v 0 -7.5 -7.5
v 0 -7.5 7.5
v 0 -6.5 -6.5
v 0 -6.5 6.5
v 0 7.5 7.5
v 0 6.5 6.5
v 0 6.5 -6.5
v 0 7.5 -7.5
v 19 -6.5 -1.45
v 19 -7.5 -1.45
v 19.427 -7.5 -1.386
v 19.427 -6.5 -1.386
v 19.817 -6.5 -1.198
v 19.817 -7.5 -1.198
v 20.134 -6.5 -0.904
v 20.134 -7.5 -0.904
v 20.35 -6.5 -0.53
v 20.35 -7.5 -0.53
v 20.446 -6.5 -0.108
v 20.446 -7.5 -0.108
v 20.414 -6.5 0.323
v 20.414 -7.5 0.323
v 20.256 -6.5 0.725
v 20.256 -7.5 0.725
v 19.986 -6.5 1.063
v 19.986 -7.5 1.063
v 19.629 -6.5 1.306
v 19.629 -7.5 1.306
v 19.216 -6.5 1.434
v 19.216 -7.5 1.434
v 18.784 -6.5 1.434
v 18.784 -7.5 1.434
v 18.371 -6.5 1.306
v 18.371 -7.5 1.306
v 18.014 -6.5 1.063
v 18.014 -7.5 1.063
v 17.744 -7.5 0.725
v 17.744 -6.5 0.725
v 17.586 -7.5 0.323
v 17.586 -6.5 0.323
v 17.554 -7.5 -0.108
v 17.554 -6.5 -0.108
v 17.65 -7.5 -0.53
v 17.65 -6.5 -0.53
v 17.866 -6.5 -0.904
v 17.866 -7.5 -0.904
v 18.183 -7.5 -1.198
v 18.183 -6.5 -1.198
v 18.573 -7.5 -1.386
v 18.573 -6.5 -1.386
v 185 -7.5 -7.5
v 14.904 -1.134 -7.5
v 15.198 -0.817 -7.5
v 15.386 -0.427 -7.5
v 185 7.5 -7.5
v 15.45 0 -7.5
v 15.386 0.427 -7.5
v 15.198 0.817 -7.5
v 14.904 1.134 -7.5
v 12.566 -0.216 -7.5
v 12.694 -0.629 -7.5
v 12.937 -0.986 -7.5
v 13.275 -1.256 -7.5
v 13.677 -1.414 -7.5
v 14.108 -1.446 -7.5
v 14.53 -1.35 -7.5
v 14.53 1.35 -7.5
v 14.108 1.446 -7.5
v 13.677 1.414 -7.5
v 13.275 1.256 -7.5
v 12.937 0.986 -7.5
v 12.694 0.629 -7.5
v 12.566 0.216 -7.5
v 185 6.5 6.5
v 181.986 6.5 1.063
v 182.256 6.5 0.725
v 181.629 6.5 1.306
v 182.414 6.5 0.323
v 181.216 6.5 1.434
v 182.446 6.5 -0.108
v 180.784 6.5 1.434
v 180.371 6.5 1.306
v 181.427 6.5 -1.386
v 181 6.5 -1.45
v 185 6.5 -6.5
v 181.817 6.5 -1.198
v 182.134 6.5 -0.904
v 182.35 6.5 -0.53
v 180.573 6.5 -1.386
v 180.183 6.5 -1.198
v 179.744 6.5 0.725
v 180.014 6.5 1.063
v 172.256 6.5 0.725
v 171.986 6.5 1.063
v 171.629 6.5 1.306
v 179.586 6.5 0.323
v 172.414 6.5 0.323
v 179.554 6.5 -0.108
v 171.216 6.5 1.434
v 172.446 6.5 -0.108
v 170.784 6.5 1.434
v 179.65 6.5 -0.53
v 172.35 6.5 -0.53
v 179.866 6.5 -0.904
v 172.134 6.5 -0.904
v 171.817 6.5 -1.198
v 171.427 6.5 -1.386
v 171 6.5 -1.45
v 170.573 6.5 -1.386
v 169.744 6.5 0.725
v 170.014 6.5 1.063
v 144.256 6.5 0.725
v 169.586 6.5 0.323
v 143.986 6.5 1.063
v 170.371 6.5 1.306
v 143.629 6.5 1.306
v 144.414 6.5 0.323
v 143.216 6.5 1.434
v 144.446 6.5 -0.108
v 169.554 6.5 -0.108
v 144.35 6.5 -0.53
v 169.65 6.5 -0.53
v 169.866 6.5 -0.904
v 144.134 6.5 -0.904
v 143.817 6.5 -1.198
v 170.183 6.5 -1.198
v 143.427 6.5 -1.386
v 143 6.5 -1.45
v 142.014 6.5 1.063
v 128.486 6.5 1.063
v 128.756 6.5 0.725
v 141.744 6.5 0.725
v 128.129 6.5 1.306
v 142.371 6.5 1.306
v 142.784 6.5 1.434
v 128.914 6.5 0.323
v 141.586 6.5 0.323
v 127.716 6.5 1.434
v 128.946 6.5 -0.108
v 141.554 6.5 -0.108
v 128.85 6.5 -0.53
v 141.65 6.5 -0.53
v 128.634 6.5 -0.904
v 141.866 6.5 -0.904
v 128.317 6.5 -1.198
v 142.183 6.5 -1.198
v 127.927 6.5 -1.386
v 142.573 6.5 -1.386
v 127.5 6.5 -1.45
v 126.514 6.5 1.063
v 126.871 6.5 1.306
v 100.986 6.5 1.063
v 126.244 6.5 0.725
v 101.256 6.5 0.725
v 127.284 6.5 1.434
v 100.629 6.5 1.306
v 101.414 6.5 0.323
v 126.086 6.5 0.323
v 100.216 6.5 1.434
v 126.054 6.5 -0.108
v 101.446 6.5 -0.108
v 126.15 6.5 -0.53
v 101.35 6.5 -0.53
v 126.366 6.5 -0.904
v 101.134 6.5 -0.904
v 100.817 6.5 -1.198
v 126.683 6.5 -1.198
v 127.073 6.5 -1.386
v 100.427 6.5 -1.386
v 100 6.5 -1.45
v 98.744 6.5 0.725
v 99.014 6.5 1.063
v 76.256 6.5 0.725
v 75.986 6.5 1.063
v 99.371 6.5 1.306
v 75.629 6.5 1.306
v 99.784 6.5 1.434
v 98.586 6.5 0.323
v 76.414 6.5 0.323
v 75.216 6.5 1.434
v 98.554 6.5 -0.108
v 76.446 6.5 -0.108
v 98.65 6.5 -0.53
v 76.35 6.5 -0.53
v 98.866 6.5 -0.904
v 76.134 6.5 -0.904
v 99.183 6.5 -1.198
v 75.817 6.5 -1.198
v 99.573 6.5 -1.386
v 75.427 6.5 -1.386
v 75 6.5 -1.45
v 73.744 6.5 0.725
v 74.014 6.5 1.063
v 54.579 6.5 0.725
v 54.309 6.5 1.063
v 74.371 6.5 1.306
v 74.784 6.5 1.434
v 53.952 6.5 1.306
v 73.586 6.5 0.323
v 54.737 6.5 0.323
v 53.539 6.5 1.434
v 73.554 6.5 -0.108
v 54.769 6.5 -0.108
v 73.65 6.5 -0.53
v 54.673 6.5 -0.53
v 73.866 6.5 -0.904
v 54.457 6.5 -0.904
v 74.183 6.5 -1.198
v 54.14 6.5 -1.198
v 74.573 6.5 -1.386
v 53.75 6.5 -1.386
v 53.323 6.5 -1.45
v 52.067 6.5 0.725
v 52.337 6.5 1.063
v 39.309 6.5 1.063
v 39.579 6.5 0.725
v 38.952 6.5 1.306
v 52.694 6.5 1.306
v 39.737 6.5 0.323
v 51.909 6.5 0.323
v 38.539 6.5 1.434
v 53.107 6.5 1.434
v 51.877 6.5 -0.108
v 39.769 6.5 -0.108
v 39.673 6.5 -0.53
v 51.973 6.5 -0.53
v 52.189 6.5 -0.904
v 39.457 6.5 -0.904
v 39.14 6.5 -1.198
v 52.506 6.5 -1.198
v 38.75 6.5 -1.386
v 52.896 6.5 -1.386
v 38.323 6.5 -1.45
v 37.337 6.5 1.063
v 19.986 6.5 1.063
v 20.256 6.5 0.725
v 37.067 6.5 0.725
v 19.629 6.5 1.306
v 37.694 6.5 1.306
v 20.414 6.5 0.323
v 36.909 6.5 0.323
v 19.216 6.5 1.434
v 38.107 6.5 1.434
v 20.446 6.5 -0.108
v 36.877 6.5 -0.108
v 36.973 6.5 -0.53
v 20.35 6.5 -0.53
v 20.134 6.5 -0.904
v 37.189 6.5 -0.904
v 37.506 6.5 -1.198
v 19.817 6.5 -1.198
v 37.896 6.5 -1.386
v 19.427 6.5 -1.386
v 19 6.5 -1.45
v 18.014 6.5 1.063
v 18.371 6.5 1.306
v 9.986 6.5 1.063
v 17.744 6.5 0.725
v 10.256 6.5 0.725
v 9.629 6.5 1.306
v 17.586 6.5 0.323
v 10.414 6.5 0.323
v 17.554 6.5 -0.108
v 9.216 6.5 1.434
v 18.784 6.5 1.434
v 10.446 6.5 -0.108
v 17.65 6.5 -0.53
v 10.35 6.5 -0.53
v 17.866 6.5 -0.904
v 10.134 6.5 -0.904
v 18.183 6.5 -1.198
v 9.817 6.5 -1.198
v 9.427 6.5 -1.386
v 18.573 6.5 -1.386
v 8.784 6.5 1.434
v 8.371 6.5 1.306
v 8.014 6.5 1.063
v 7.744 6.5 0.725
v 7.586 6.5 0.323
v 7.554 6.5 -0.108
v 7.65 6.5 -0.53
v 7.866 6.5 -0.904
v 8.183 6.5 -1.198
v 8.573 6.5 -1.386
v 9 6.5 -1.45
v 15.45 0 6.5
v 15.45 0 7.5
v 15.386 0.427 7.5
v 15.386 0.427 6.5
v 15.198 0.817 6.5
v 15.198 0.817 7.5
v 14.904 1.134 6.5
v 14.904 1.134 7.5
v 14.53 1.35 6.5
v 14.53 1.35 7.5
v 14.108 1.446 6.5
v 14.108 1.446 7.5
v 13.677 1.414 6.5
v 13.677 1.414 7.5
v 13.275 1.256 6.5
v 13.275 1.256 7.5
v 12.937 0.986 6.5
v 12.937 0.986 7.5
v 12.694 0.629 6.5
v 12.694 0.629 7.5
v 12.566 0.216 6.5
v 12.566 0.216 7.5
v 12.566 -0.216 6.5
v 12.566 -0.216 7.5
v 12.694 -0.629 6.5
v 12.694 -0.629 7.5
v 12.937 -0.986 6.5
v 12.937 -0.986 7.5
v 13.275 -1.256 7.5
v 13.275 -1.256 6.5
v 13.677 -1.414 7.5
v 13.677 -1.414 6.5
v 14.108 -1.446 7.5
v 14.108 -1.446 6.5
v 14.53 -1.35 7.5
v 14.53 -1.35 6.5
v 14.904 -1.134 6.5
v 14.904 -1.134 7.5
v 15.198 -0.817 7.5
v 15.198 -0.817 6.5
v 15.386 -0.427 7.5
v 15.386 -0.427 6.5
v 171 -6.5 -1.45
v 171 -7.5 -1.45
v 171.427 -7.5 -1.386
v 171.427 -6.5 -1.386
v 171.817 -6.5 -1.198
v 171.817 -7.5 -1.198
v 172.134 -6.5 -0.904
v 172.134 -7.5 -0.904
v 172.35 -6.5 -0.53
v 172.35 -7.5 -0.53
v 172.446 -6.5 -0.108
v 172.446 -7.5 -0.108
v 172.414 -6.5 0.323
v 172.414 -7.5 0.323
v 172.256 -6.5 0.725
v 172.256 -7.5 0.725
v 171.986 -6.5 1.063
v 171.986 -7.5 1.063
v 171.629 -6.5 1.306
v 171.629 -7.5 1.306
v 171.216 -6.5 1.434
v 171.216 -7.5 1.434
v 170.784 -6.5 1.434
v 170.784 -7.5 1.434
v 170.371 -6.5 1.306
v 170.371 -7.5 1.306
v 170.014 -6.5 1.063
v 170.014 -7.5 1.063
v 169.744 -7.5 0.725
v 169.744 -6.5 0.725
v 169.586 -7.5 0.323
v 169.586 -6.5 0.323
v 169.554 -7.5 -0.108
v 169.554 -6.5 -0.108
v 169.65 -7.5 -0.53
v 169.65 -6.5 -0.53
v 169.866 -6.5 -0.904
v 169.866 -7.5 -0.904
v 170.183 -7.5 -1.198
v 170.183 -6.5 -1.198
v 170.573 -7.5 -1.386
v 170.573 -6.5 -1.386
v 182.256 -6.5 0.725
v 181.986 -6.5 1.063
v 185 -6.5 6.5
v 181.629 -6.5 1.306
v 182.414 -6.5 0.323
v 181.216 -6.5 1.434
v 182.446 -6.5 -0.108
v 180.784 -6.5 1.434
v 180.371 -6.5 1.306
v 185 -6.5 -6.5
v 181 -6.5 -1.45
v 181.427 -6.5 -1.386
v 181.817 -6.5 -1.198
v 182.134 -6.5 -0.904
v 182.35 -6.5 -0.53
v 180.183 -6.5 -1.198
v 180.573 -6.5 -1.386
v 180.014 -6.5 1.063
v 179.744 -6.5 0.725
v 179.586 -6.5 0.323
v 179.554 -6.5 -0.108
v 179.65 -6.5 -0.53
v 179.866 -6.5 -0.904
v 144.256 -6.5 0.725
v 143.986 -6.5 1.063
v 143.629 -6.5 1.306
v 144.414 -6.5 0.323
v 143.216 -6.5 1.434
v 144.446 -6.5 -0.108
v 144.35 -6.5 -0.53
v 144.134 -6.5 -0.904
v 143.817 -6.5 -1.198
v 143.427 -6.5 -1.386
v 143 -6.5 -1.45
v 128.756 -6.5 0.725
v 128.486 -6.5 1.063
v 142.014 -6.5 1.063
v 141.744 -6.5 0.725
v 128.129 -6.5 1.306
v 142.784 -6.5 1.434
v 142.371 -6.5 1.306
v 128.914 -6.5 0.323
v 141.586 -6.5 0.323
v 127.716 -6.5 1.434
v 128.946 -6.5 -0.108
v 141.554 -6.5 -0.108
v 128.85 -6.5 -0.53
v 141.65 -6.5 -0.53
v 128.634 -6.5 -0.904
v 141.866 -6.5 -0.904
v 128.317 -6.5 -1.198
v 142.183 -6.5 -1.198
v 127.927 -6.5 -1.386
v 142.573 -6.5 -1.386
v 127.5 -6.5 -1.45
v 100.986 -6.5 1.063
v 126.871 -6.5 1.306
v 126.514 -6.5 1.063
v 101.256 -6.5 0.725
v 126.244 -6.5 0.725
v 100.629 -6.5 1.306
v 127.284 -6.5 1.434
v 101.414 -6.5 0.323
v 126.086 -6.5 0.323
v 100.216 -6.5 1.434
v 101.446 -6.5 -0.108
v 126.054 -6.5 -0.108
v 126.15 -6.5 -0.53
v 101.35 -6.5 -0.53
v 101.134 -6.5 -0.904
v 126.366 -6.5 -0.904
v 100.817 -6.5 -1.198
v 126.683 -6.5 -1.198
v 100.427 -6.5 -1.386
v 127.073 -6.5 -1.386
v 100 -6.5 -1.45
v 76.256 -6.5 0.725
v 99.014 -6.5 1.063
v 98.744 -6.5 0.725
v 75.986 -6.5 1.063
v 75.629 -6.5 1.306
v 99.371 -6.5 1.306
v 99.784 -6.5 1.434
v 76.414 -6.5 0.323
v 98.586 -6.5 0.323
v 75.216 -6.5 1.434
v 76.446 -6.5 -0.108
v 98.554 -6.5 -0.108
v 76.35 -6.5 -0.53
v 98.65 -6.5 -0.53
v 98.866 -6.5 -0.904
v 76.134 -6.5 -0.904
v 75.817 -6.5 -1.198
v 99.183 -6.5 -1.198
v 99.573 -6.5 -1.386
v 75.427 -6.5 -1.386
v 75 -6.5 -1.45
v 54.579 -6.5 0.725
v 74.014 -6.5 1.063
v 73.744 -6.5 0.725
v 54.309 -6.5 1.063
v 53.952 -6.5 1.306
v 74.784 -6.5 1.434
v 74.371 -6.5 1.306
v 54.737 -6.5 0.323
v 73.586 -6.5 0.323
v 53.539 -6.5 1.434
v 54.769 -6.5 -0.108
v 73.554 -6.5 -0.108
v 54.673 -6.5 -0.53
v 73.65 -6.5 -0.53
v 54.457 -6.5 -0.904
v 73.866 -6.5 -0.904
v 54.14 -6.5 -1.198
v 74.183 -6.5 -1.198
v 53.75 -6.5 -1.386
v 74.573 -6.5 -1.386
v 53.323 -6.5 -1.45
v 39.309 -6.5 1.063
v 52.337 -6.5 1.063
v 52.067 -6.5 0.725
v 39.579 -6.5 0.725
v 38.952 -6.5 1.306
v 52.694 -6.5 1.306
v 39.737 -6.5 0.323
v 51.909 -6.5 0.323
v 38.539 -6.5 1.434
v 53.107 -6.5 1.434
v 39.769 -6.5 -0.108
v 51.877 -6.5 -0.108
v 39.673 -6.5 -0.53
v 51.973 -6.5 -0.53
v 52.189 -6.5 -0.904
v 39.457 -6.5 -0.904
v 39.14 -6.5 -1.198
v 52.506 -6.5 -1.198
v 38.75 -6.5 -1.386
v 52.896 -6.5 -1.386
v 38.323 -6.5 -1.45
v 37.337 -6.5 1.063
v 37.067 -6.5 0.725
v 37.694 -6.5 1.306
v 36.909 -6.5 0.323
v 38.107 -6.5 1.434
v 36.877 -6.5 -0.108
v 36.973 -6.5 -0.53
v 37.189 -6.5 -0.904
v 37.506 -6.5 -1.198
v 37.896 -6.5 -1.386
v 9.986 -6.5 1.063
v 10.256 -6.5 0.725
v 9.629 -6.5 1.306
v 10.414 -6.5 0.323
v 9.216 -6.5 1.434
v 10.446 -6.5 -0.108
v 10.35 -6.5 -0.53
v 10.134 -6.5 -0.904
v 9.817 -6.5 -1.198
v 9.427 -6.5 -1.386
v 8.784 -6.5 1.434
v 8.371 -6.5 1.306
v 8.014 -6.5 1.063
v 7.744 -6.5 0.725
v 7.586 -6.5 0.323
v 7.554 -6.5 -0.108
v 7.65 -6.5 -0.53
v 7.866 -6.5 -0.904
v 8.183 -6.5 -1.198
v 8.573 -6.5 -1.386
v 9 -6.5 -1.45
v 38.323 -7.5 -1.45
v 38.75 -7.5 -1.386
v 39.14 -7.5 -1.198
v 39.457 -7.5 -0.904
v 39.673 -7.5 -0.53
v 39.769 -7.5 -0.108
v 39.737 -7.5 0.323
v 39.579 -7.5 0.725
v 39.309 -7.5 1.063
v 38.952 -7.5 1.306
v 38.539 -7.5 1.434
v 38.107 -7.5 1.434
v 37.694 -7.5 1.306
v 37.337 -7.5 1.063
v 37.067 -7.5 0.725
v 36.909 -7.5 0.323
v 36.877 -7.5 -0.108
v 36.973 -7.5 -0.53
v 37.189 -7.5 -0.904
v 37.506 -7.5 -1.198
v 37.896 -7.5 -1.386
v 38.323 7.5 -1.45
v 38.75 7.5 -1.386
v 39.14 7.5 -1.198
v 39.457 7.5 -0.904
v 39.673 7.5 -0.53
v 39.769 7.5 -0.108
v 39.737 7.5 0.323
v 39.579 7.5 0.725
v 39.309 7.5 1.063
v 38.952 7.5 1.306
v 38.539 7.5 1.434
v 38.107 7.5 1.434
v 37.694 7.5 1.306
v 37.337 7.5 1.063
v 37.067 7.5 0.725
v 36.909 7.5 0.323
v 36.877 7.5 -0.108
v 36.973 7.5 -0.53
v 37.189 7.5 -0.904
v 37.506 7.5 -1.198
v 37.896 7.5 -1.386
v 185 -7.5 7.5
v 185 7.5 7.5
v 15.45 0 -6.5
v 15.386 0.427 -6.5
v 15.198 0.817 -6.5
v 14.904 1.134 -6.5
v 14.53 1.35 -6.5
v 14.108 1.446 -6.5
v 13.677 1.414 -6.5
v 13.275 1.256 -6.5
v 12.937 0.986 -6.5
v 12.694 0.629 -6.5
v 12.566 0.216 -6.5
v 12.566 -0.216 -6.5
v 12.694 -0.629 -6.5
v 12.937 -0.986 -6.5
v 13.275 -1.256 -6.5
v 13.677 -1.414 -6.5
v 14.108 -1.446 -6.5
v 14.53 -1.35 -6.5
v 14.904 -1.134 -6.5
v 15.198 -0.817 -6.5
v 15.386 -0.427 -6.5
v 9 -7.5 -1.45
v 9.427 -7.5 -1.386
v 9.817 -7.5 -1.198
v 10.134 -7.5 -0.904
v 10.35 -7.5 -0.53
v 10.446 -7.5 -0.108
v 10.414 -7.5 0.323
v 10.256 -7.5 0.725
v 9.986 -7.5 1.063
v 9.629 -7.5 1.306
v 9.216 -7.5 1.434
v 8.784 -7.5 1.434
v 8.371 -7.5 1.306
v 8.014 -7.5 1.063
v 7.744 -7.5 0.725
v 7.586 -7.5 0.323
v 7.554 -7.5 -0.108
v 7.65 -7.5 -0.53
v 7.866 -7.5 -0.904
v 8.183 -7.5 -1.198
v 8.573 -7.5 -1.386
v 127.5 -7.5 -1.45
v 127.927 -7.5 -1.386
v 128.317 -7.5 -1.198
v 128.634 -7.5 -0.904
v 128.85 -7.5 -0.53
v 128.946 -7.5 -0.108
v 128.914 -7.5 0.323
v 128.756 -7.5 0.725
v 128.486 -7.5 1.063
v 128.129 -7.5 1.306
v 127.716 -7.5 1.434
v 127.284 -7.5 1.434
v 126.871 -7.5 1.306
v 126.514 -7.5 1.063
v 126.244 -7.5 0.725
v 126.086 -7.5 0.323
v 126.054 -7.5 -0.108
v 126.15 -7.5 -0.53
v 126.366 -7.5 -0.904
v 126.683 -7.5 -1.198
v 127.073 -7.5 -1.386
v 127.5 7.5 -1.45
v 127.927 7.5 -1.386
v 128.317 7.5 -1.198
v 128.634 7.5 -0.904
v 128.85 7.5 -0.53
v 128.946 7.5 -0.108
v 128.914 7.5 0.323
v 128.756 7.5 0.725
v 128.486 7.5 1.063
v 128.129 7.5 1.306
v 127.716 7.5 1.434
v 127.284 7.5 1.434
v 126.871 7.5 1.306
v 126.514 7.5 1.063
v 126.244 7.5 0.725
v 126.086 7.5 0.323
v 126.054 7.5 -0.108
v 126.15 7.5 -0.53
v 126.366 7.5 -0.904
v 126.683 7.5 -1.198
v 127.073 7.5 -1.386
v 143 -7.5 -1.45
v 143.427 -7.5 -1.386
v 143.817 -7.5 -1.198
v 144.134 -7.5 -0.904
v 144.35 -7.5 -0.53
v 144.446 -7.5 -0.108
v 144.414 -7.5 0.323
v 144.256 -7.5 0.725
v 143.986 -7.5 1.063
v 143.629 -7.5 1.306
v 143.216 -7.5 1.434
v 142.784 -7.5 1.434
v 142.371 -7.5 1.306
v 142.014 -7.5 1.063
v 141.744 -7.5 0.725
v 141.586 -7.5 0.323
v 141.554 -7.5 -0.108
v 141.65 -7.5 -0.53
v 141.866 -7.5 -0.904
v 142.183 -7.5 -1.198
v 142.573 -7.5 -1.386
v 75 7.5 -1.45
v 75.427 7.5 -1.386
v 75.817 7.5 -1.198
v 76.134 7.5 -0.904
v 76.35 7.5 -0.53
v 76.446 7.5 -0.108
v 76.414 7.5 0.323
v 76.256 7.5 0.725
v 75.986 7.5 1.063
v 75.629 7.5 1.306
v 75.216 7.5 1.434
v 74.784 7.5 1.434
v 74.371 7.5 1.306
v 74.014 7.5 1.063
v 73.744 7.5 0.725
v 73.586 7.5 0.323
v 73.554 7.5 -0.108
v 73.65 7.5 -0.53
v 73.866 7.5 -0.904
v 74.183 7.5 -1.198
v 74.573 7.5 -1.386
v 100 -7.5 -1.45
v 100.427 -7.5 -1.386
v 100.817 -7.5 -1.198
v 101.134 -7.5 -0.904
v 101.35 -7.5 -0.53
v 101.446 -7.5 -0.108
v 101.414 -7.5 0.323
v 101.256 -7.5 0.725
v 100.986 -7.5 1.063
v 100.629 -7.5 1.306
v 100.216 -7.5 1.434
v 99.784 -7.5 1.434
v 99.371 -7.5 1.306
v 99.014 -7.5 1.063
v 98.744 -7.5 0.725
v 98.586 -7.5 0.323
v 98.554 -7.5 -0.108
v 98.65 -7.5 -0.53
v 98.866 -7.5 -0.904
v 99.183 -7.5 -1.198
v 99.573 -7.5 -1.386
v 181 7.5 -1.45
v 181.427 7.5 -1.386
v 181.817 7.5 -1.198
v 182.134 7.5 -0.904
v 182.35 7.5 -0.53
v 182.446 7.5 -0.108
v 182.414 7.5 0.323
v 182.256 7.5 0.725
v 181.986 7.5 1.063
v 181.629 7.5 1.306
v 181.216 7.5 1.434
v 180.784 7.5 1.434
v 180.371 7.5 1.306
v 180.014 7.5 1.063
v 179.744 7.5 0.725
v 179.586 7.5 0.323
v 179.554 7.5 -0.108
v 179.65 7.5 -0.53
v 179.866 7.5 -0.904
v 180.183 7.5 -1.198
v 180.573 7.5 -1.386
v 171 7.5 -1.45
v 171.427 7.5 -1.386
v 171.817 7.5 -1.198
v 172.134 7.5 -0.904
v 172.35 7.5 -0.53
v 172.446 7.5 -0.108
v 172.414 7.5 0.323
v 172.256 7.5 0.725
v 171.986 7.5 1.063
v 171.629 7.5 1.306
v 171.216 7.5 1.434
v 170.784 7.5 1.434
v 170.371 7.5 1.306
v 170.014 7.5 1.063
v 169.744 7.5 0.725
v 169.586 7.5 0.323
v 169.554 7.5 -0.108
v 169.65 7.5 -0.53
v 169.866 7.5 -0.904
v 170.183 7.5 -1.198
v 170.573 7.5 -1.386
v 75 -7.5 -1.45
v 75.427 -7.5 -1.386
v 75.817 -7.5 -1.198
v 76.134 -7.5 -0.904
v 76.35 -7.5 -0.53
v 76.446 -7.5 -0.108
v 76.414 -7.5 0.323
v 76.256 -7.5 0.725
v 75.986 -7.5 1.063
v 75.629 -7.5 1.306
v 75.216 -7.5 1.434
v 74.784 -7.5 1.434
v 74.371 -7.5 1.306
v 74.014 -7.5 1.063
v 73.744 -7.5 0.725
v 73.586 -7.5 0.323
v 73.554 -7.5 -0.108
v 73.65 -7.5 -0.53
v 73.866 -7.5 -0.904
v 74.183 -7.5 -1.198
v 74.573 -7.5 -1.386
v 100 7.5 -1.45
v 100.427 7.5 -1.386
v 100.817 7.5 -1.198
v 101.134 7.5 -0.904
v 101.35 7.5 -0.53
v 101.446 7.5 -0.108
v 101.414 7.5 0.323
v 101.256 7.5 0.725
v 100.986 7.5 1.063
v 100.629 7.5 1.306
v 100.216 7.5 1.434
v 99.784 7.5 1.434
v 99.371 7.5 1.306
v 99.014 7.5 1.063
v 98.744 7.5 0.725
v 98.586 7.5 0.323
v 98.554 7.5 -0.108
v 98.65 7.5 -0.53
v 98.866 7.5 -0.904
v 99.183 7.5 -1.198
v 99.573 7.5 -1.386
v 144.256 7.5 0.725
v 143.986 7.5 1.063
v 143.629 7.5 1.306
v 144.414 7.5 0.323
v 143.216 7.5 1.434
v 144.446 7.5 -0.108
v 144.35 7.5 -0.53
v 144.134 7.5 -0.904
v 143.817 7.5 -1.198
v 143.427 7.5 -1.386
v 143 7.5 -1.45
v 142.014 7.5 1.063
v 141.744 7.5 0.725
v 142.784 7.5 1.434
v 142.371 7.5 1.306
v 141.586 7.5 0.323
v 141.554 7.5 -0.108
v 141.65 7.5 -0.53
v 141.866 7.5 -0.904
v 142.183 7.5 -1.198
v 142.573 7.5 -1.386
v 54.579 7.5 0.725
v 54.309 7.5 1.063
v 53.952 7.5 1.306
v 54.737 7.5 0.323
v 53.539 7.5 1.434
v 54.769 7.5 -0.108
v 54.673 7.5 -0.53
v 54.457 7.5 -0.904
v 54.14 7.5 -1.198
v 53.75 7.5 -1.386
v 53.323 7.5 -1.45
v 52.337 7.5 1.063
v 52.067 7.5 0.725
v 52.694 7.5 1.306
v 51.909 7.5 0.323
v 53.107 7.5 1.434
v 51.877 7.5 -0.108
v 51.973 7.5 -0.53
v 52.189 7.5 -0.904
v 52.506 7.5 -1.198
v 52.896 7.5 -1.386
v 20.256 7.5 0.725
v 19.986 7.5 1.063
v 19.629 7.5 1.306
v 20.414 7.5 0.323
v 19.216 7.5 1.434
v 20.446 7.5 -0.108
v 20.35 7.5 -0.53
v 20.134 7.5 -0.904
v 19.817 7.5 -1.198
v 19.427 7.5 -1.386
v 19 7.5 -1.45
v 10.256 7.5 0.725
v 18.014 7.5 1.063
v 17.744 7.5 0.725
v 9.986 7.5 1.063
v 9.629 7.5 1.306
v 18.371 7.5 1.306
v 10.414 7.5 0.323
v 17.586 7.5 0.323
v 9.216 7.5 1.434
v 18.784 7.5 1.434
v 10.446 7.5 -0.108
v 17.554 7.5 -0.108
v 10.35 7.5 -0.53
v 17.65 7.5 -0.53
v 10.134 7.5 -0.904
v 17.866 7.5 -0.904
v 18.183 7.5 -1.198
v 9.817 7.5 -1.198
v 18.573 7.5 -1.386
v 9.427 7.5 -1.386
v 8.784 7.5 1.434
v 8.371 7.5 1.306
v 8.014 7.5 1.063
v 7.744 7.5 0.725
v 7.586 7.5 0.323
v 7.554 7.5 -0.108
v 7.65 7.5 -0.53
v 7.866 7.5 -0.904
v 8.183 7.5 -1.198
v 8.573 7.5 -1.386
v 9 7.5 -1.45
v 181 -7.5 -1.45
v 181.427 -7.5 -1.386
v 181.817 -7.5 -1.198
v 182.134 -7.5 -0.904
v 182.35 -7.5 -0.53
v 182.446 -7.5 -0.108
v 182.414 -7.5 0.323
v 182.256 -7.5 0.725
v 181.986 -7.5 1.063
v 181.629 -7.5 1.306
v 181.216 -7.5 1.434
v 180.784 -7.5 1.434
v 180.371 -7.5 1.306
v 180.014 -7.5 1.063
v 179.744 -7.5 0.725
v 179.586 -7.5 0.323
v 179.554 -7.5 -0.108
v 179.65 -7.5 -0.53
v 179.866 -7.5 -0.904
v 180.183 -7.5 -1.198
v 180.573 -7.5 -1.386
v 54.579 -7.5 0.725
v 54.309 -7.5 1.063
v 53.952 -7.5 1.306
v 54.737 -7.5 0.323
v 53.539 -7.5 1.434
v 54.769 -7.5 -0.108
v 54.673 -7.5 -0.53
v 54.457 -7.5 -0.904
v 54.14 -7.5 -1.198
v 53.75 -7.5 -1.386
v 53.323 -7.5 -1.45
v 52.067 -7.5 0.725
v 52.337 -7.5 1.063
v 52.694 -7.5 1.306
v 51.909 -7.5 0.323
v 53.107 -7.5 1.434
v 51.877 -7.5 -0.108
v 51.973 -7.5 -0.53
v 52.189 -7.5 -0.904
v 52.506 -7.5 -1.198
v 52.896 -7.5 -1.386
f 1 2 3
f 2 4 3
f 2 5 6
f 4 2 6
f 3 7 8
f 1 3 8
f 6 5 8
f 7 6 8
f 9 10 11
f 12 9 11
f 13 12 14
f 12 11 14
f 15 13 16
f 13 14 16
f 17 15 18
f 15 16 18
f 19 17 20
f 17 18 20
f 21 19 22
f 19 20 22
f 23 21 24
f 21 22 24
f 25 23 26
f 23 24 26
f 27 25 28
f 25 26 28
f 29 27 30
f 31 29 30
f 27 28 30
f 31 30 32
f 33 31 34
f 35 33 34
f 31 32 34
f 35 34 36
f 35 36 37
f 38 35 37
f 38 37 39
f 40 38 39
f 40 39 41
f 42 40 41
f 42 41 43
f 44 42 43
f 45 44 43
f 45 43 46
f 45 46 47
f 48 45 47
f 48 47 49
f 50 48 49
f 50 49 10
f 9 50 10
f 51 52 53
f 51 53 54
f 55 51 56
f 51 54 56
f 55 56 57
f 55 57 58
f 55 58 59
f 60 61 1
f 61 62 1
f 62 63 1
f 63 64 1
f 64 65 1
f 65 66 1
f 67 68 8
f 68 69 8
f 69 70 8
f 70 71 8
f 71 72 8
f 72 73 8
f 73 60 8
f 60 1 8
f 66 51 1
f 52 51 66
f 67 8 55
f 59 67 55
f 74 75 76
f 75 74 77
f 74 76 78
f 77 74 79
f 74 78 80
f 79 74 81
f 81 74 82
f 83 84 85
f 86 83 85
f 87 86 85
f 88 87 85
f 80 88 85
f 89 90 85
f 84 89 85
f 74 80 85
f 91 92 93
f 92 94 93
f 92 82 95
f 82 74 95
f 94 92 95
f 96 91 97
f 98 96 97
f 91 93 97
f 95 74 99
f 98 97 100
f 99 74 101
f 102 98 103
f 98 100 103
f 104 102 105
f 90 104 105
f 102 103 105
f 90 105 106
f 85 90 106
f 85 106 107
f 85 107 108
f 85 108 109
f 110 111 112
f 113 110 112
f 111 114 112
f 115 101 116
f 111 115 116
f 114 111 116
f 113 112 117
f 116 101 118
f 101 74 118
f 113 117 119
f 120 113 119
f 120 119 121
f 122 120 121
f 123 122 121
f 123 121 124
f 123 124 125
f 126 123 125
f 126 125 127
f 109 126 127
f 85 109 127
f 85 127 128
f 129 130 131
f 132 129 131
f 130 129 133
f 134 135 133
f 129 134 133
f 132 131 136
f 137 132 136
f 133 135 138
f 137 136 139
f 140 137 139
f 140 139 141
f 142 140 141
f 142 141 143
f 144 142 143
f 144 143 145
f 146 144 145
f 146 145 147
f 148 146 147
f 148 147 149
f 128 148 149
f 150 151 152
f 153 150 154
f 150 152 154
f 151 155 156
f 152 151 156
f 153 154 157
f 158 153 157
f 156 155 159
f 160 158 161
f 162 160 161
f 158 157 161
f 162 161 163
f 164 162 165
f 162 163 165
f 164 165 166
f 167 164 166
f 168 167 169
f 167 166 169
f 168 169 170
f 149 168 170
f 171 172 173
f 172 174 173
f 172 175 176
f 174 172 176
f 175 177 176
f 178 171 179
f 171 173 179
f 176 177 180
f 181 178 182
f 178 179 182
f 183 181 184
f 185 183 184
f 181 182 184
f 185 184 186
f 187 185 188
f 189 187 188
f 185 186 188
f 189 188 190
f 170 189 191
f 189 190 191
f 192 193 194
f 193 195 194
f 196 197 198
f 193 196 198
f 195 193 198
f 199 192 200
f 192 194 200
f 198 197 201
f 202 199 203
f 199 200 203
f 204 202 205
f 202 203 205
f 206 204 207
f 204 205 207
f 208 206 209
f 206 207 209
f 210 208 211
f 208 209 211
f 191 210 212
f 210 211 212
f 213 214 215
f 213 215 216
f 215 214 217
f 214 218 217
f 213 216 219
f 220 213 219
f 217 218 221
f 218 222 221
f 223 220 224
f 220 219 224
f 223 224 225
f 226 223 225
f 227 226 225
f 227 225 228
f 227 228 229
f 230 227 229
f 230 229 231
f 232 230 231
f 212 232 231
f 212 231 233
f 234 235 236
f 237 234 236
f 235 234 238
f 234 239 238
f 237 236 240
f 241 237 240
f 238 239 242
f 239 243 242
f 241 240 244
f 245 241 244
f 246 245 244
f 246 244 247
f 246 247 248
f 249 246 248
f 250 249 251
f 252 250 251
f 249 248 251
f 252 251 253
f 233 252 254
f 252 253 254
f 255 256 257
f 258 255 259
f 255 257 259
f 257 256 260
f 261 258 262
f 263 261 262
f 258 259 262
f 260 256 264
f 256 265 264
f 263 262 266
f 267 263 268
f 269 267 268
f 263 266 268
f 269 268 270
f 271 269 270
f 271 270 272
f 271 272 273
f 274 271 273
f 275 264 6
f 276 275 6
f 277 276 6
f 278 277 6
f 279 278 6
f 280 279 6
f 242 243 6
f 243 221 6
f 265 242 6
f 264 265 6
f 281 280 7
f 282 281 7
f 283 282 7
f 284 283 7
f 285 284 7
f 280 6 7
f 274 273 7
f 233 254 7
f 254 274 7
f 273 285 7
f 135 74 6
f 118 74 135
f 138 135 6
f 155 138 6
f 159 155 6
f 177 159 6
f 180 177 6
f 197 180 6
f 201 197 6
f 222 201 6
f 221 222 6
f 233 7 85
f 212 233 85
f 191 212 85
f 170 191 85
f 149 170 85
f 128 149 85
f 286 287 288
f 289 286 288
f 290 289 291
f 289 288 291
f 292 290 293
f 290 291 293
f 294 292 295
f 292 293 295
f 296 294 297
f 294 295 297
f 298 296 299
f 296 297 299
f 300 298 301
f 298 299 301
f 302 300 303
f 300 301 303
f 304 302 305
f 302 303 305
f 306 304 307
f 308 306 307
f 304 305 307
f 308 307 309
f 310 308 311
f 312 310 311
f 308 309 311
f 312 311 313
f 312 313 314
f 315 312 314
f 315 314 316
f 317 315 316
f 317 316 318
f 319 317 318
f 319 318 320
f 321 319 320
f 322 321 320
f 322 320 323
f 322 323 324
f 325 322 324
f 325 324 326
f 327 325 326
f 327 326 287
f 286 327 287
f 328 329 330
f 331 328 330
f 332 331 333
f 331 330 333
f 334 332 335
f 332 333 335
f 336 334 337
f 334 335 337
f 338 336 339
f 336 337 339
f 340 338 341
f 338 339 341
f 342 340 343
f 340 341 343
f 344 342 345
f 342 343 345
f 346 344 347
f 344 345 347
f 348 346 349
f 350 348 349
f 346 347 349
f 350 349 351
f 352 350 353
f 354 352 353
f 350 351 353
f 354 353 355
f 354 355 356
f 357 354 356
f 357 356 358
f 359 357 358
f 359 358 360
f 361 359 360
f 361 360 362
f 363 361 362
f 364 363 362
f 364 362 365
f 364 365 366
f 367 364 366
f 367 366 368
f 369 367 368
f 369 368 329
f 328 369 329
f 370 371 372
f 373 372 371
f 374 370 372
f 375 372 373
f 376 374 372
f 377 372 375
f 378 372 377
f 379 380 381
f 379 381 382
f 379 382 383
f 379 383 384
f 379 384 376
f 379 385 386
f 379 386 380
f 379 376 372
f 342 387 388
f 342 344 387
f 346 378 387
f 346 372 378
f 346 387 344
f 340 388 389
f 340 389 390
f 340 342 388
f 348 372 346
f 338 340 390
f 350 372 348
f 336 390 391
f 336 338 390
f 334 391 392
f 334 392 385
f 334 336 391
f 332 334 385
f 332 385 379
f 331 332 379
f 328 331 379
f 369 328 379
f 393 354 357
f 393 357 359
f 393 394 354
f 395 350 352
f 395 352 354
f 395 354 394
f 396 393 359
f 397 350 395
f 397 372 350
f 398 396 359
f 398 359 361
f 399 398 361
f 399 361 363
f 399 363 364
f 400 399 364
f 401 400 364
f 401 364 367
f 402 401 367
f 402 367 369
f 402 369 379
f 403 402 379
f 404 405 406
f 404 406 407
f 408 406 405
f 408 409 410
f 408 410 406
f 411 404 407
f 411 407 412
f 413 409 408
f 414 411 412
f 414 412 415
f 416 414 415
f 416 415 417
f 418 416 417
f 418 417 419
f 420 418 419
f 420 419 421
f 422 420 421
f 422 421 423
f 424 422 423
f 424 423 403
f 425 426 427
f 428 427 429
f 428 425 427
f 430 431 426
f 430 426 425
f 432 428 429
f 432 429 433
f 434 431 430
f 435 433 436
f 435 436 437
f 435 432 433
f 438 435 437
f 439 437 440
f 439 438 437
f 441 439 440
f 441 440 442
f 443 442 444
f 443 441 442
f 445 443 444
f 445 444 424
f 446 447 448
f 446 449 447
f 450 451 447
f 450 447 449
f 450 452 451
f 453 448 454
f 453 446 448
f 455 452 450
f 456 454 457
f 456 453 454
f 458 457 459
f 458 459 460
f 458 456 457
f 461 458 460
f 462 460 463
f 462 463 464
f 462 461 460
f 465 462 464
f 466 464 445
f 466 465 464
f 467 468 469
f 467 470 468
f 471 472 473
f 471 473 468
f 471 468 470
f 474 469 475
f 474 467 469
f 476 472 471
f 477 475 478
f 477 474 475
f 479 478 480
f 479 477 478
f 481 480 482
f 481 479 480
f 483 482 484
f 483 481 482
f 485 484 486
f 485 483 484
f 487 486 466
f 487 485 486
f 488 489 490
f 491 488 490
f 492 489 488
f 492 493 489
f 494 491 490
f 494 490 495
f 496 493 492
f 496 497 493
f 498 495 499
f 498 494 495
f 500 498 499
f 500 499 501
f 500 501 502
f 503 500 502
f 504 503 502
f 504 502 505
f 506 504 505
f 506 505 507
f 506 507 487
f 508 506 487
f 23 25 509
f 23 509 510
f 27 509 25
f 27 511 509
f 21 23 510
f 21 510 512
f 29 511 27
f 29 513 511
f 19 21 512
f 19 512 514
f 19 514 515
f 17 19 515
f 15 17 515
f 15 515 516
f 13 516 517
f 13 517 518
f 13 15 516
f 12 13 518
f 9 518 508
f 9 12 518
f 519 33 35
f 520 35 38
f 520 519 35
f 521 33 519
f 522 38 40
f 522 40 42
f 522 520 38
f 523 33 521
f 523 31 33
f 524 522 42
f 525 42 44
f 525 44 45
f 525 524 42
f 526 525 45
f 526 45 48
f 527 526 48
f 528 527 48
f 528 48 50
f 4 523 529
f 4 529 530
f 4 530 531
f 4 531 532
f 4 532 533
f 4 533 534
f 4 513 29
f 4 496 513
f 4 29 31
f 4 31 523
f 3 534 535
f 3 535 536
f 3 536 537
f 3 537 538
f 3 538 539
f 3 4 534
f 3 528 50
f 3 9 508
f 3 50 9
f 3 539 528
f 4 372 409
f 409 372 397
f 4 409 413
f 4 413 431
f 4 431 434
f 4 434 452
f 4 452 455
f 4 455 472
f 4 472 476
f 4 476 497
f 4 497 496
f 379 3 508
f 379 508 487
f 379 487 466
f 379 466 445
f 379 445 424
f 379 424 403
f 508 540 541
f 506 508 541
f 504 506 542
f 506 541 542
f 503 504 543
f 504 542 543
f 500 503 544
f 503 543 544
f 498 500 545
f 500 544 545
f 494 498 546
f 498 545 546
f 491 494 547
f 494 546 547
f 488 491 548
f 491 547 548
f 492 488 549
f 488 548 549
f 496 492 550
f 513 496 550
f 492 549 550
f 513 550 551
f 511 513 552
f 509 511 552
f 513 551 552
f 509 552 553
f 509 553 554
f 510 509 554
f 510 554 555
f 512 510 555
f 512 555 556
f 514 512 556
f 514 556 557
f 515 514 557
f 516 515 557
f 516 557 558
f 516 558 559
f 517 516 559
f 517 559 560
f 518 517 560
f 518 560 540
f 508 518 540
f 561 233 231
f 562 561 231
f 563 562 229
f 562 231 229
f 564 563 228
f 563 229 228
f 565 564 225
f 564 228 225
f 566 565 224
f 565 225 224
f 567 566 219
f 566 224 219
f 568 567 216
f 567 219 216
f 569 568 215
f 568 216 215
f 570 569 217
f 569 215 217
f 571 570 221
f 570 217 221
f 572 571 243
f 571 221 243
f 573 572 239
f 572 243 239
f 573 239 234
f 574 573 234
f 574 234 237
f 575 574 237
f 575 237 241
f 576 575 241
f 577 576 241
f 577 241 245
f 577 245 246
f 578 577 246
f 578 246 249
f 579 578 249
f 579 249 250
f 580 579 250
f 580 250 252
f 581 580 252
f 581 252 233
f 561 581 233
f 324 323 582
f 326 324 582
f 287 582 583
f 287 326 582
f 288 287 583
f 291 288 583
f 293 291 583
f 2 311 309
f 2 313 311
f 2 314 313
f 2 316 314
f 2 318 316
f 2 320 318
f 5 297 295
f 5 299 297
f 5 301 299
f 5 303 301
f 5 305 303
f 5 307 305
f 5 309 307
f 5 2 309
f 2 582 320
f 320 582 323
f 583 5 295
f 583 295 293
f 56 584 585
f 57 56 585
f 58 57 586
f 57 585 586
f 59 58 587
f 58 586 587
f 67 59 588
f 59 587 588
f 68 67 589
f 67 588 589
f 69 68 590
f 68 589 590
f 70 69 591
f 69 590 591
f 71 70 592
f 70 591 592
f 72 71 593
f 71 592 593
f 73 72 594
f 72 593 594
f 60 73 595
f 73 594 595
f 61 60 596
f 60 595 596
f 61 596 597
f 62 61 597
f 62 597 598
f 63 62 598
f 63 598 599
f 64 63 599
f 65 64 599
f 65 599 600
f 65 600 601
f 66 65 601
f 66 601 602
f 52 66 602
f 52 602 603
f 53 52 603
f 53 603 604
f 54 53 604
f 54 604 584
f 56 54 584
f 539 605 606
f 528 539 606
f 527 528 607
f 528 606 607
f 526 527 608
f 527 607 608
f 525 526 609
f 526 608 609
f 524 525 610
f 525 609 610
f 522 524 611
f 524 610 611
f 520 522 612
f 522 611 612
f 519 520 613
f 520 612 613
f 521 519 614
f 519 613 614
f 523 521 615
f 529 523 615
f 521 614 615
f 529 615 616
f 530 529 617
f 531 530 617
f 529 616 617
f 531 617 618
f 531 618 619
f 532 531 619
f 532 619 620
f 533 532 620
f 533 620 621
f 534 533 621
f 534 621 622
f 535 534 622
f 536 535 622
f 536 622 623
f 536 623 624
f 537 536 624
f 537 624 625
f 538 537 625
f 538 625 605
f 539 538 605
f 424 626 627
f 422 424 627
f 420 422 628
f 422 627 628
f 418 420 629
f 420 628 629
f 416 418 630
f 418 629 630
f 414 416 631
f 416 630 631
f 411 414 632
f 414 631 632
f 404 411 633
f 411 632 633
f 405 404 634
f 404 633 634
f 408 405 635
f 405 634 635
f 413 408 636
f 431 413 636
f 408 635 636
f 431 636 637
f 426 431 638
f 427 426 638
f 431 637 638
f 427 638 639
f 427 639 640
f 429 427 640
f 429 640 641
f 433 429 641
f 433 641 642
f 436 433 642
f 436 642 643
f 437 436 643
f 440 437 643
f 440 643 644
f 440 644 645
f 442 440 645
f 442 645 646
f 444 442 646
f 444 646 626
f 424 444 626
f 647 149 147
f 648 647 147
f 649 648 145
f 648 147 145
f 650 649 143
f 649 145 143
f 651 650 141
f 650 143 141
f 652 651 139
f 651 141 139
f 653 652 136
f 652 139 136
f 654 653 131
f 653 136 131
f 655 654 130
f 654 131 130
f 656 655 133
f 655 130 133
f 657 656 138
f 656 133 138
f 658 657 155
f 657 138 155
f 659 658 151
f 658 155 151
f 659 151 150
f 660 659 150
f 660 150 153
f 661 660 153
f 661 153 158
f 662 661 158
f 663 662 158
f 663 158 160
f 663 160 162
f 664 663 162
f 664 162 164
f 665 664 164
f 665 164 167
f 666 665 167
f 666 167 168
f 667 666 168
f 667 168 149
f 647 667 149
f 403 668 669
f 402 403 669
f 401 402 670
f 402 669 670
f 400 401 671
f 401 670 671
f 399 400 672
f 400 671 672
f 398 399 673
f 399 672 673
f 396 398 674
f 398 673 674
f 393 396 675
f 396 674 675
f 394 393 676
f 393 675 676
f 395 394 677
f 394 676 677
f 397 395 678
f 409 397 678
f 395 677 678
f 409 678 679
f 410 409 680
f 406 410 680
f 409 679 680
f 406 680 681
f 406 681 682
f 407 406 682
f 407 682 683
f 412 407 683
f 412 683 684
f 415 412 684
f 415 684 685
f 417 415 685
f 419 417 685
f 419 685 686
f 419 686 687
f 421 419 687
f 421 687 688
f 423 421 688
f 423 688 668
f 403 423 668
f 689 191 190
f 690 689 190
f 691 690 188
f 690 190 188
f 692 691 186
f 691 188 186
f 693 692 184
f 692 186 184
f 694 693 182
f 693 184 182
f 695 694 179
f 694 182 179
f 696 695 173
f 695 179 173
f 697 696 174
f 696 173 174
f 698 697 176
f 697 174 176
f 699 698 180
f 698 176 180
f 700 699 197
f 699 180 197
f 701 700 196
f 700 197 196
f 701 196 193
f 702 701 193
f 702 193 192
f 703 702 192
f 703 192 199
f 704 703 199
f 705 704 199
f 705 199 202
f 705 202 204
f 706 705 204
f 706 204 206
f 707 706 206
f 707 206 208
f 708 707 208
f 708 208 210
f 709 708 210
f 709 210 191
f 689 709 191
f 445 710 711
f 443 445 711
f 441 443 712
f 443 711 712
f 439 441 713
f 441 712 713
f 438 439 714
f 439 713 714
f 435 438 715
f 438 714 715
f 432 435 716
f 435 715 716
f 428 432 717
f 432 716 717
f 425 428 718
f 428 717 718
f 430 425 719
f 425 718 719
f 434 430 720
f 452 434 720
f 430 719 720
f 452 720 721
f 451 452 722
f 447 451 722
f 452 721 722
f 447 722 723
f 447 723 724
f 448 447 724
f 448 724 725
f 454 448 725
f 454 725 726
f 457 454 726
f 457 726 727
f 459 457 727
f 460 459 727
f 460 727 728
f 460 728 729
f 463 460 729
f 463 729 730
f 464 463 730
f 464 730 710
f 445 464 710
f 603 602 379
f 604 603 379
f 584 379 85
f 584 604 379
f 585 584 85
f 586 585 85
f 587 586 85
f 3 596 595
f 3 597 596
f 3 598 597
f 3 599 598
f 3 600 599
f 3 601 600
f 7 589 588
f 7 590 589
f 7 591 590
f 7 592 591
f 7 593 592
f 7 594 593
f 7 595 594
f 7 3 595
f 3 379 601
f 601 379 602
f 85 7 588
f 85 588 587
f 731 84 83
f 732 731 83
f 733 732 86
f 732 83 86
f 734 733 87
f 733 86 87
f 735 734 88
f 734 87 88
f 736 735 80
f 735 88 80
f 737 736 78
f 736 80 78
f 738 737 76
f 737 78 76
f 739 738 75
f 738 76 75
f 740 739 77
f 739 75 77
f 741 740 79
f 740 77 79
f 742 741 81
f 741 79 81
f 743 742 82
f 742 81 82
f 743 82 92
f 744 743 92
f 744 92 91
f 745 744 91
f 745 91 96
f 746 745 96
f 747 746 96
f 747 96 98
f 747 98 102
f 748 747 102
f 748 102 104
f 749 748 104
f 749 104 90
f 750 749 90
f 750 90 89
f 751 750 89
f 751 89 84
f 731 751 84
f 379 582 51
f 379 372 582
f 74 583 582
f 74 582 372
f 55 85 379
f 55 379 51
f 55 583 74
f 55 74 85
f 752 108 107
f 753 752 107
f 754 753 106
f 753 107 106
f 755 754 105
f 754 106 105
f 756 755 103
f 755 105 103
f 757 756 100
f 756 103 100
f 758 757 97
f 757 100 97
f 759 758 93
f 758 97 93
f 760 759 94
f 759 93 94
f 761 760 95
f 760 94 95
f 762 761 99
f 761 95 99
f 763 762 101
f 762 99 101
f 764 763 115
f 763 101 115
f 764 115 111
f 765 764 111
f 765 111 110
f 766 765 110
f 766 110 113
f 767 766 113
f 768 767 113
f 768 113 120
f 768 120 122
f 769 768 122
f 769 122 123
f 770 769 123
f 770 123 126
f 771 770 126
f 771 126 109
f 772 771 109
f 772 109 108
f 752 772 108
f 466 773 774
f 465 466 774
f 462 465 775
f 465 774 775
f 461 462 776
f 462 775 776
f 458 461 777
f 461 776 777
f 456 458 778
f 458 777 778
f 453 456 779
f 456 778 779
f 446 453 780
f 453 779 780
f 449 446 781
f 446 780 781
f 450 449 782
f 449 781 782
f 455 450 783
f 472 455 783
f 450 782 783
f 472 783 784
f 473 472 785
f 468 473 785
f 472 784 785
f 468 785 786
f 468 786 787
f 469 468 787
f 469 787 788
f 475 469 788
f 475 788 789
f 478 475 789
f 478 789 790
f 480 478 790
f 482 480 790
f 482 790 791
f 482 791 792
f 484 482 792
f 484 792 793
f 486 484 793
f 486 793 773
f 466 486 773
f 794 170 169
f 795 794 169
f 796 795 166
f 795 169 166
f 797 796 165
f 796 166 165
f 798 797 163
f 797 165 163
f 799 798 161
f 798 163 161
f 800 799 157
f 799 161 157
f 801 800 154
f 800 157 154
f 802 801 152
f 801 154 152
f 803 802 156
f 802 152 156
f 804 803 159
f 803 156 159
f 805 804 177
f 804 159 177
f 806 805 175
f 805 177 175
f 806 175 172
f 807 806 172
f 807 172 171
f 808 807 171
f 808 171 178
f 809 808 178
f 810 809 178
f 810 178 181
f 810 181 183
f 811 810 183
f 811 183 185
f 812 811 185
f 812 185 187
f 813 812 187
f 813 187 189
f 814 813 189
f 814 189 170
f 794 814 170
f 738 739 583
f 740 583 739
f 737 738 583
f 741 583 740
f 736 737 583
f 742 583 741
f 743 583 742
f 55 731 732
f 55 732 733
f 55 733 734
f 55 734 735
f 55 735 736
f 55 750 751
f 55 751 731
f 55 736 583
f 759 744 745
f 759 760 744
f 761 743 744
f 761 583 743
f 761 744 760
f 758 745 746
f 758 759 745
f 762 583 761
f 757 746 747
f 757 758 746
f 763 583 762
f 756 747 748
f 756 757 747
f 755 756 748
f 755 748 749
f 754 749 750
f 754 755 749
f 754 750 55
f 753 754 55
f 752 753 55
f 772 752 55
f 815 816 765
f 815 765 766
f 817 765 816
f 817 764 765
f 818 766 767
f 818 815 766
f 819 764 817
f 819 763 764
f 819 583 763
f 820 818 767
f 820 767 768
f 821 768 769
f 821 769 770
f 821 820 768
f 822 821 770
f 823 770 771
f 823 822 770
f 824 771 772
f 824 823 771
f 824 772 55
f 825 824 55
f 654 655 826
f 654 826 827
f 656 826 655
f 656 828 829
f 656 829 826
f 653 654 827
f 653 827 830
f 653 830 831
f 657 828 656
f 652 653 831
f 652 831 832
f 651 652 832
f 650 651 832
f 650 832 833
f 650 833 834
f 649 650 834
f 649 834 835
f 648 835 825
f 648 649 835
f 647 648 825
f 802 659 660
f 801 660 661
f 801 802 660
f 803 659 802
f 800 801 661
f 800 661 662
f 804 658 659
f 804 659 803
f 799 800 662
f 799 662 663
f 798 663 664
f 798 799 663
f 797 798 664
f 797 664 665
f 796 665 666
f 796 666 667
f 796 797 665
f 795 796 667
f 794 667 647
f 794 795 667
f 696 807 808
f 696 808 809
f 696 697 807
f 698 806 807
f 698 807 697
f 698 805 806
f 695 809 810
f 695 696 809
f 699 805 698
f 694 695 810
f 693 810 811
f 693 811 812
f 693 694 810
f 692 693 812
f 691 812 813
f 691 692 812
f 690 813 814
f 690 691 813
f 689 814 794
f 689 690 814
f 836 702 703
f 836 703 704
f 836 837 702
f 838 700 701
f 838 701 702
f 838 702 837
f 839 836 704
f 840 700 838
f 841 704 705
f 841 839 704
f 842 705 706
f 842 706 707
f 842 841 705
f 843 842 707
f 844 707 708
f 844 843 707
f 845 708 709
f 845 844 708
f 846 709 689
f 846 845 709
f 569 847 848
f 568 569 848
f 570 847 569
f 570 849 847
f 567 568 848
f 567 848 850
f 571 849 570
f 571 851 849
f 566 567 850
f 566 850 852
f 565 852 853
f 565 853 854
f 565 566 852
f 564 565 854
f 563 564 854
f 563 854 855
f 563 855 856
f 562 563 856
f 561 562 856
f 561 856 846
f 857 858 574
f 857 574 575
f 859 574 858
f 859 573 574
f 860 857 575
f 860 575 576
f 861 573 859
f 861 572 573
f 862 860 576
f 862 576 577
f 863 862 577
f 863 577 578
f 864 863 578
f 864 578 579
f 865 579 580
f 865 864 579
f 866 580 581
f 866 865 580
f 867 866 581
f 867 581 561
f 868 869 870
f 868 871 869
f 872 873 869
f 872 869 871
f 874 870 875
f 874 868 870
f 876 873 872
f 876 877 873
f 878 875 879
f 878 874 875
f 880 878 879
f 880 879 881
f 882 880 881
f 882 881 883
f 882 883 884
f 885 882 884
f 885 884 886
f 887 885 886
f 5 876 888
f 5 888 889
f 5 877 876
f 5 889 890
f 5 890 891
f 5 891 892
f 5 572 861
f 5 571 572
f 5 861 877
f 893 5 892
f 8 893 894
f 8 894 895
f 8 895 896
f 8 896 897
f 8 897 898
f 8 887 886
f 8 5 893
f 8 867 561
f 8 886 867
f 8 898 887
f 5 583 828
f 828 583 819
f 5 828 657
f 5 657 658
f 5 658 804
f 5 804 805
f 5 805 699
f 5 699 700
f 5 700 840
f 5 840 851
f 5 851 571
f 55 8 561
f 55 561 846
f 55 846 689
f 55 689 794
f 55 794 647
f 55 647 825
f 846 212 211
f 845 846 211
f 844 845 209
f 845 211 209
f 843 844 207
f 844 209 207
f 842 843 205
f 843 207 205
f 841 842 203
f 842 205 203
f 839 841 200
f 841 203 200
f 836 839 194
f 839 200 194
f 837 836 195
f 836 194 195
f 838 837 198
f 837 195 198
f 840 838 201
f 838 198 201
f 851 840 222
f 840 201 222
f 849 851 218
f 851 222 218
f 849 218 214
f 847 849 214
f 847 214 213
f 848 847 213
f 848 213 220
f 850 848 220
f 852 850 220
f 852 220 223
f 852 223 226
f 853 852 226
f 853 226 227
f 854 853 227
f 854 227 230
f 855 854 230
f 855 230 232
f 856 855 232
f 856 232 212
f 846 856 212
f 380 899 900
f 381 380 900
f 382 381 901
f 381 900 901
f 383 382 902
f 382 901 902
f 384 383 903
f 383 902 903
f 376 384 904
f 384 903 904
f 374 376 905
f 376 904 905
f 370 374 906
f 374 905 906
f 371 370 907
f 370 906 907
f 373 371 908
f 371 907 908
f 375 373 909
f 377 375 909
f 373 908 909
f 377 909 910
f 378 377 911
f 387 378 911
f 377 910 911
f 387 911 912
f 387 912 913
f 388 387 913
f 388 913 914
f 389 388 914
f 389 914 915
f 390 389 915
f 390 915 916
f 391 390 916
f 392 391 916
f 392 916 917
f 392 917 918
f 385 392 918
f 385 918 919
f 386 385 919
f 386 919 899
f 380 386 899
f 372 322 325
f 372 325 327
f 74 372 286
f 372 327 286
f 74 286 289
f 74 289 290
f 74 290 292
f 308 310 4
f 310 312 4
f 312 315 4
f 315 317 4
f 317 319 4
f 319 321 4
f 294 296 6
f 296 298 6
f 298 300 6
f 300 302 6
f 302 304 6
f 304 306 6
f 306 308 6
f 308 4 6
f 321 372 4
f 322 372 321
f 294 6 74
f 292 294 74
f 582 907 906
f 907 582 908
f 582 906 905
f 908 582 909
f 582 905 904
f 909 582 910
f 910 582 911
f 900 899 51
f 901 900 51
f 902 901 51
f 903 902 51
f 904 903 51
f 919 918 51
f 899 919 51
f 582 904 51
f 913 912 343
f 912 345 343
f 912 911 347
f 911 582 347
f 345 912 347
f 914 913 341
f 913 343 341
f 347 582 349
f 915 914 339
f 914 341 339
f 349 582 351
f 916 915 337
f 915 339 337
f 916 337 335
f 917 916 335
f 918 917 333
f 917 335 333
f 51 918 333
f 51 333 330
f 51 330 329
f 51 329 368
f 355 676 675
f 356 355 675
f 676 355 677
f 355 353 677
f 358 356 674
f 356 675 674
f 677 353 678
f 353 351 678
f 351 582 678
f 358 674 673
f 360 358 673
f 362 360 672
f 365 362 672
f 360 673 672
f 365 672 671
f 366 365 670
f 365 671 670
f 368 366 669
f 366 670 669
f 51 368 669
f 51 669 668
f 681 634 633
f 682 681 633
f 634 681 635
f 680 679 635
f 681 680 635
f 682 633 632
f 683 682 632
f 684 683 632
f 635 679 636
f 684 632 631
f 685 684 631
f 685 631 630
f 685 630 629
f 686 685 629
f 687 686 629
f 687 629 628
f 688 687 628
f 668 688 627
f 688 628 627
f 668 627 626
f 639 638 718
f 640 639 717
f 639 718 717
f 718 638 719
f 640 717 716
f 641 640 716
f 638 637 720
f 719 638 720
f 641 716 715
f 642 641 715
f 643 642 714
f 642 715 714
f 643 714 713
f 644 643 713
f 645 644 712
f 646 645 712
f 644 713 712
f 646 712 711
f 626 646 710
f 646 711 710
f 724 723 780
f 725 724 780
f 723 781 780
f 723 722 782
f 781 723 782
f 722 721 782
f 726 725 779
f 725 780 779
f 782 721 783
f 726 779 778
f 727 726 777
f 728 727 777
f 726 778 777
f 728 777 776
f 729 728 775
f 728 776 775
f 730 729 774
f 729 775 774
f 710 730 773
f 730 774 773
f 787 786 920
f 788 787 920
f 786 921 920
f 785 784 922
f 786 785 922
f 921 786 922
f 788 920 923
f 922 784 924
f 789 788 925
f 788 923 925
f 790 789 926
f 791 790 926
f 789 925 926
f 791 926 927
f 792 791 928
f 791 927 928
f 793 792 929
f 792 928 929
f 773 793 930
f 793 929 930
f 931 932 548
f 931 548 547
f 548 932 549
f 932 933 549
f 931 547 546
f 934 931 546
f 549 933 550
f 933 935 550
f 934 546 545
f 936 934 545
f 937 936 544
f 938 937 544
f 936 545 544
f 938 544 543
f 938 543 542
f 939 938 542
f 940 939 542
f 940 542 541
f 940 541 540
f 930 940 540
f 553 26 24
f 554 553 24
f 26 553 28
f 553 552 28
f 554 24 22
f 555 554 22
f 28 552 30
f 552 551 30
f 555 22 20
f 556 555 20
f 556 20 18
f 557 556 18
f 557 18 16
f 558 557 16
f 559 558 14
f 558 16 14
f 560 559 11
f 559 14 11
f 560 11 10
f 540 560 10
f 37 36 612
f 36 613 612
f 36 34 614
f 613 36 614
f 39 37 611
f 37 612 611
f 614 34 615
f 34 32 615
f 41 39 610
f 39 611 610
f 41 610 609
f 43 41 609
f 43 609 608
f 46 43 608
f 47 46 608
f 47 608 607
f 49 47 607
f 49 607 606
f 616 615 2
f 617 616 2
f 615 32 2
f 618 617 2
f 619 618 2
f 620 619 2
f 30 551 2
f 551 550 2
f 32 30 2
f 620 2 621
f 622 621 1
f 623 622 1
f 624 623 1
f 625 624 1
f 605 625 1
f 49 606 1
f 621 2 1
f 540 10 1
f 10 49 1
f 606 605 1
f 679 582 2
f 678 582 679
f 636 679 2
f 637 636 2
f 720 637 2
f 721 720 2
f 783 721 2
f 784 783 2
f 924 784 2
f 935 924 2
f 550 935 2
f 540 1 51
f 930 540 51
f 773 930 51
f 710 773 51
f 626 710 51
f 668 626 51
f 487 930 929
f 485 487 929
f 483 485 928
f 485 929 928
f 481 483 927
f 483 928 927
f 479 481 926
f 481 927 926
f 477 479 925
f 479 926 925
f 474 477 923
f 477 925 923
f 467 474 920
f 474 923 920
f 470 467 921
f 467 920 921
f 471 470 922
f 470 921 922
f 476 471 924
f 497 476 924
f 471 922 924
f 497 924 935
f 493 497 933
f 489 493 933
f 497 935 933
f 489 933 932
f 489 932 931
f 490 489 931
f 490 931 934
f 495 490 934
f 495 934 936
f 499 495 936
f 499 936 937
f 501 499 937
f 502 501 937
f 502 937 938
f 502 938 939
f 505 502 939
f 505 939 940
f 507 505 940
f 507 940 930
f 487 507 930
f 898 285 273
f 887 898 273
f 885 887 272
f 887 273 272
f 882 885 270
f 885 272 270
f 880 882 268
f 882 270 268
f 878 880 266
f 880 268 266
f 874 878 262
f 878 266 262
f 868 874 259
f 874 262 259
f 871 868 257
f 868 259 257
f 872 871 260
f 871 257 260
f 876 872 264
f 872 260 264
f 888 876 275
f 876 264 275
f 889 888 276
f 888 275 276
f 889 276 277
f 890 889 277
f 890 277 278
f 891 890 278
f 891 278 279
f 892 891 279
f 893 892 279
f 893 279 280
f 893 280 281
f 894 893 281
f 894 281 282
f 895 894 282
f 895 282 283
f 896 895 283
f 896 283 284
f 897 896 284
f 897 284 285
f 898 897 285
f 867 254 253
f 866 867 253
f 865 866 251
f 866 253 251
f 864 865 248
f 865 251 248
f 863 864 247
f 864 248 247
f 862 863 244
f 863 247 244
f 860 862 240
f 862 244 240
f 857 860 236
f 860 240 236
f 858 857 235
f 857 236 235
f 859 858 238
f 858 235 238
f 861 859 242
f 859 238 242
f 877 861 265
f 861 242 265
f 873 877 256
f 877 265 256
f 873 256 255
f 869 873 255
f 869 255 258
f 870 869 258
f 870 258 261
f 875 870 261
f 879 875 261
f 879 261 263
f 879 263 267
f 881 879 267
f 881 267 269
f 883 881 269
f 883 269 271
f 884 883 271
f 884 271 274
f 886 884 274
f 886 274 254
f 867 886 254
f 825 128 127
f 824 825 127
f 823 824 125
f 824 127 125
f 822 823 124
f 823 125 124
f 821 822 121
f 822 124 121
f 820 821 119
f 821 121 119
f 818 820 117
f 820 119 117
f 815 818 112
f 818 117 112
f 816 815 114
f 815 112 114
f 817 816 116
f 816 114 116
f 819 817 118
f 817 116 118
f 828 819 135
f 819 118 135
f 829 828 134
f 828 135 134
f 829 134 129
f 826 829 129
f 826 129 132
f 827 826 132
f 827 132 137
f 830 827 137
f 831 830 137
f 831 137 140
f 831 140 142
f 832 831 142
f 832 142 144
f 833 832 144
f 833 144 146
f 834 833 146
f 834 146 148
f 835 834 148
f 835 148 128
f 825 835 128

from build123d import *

# Parameters (mm, degrees)
SKETCH_1_W          = 15
SKETCH_1_H          = 15
SKETCH_1_W_2        = 13
SKETCH_1_H_2        = 13
EXTRUDE_1_DEPTH     = 185
SKETCH_2_R          = 1.45
CUT_EXTRUDE_1_DEPTH = 186.758579883
SKETCH_3_R          = 1.45
CUT_EXTRUDE_2_DEPTH = 186.758579883


with BuildPart() as part:
    # 草图1 → 凸台-拉伸1 (new body)
    with BuildSketch(Plane(origin=(0, 0, 0), x_dir=(0, 0, -1), z_dir=(1, 0, 0))):
        Rectangle(SKETCH_1_W, SKETCH_1_H)
        Rectangle(SKETCH_1_W_2, SKETCH_1_H_2, mode=Mode.SUBTRACT)
    extrude(amount=EXTRUDE_1_DEPTH)

    # 草图2 → 切除-拉伸1 (cut, through all)
    with BuildSketch(Plane.XZ.offset(7.5)):
        with Locations(Location((181, 0, 0), (0, 0, 270))):
            Circle(SKETCH_2_R)
        with Locations(Location((171, 0, 0), (0, 0, 270))):
            Circle(SKETCH_2_R)
        with Locations(Location((127.5, 0, 0), (0, 0, 270))):
            Circle(SKETCH_2_R)
        with Locations(Location((100, 0, 0), (0, 0, 270))):
            Circle(SKETCH_2_R)
        with Locations(Location((75, 0, 0), (0, 0, 270))):
            Circle(SKETCH_2_R)
        with Locations(Location((19, 0, 0), (0, 0, 270))):
            Circle(SKETCH_2_R)
        with Locations(Location((9, 0, 0), (0, 0, 270))):
            Circle(SKETCH_2_R)
        with Locations(Location((143, 0, 0), (0, 0, 270))):
            Circle(SKETCH_2_R)
        with Locations(Location((38.322949017, 0, 0), (0, 0, 270))):
            Circle(SKETCH_2_R)
        with Locations(Location((53.322949017, 0, 0), (0, 0, 270))):
            Circle(SKETCH_2_R)
    extrude(amount=-CUT_EXTRUDE_1_DEPTH, mode=Mode.SUBTRACT)

    # 草图3 → 切除-拉伸2 (cut, through all)
    with BuildSketch(Plane.XY.offset(7.5)):
        with Locations((14, 0)):
            Circle(SKETCH_3_R)
    extrude(amount=-CUT_EXTRUDE_2_DEPTH, mode=Mode.SUBTRACT)


solid = part.part
